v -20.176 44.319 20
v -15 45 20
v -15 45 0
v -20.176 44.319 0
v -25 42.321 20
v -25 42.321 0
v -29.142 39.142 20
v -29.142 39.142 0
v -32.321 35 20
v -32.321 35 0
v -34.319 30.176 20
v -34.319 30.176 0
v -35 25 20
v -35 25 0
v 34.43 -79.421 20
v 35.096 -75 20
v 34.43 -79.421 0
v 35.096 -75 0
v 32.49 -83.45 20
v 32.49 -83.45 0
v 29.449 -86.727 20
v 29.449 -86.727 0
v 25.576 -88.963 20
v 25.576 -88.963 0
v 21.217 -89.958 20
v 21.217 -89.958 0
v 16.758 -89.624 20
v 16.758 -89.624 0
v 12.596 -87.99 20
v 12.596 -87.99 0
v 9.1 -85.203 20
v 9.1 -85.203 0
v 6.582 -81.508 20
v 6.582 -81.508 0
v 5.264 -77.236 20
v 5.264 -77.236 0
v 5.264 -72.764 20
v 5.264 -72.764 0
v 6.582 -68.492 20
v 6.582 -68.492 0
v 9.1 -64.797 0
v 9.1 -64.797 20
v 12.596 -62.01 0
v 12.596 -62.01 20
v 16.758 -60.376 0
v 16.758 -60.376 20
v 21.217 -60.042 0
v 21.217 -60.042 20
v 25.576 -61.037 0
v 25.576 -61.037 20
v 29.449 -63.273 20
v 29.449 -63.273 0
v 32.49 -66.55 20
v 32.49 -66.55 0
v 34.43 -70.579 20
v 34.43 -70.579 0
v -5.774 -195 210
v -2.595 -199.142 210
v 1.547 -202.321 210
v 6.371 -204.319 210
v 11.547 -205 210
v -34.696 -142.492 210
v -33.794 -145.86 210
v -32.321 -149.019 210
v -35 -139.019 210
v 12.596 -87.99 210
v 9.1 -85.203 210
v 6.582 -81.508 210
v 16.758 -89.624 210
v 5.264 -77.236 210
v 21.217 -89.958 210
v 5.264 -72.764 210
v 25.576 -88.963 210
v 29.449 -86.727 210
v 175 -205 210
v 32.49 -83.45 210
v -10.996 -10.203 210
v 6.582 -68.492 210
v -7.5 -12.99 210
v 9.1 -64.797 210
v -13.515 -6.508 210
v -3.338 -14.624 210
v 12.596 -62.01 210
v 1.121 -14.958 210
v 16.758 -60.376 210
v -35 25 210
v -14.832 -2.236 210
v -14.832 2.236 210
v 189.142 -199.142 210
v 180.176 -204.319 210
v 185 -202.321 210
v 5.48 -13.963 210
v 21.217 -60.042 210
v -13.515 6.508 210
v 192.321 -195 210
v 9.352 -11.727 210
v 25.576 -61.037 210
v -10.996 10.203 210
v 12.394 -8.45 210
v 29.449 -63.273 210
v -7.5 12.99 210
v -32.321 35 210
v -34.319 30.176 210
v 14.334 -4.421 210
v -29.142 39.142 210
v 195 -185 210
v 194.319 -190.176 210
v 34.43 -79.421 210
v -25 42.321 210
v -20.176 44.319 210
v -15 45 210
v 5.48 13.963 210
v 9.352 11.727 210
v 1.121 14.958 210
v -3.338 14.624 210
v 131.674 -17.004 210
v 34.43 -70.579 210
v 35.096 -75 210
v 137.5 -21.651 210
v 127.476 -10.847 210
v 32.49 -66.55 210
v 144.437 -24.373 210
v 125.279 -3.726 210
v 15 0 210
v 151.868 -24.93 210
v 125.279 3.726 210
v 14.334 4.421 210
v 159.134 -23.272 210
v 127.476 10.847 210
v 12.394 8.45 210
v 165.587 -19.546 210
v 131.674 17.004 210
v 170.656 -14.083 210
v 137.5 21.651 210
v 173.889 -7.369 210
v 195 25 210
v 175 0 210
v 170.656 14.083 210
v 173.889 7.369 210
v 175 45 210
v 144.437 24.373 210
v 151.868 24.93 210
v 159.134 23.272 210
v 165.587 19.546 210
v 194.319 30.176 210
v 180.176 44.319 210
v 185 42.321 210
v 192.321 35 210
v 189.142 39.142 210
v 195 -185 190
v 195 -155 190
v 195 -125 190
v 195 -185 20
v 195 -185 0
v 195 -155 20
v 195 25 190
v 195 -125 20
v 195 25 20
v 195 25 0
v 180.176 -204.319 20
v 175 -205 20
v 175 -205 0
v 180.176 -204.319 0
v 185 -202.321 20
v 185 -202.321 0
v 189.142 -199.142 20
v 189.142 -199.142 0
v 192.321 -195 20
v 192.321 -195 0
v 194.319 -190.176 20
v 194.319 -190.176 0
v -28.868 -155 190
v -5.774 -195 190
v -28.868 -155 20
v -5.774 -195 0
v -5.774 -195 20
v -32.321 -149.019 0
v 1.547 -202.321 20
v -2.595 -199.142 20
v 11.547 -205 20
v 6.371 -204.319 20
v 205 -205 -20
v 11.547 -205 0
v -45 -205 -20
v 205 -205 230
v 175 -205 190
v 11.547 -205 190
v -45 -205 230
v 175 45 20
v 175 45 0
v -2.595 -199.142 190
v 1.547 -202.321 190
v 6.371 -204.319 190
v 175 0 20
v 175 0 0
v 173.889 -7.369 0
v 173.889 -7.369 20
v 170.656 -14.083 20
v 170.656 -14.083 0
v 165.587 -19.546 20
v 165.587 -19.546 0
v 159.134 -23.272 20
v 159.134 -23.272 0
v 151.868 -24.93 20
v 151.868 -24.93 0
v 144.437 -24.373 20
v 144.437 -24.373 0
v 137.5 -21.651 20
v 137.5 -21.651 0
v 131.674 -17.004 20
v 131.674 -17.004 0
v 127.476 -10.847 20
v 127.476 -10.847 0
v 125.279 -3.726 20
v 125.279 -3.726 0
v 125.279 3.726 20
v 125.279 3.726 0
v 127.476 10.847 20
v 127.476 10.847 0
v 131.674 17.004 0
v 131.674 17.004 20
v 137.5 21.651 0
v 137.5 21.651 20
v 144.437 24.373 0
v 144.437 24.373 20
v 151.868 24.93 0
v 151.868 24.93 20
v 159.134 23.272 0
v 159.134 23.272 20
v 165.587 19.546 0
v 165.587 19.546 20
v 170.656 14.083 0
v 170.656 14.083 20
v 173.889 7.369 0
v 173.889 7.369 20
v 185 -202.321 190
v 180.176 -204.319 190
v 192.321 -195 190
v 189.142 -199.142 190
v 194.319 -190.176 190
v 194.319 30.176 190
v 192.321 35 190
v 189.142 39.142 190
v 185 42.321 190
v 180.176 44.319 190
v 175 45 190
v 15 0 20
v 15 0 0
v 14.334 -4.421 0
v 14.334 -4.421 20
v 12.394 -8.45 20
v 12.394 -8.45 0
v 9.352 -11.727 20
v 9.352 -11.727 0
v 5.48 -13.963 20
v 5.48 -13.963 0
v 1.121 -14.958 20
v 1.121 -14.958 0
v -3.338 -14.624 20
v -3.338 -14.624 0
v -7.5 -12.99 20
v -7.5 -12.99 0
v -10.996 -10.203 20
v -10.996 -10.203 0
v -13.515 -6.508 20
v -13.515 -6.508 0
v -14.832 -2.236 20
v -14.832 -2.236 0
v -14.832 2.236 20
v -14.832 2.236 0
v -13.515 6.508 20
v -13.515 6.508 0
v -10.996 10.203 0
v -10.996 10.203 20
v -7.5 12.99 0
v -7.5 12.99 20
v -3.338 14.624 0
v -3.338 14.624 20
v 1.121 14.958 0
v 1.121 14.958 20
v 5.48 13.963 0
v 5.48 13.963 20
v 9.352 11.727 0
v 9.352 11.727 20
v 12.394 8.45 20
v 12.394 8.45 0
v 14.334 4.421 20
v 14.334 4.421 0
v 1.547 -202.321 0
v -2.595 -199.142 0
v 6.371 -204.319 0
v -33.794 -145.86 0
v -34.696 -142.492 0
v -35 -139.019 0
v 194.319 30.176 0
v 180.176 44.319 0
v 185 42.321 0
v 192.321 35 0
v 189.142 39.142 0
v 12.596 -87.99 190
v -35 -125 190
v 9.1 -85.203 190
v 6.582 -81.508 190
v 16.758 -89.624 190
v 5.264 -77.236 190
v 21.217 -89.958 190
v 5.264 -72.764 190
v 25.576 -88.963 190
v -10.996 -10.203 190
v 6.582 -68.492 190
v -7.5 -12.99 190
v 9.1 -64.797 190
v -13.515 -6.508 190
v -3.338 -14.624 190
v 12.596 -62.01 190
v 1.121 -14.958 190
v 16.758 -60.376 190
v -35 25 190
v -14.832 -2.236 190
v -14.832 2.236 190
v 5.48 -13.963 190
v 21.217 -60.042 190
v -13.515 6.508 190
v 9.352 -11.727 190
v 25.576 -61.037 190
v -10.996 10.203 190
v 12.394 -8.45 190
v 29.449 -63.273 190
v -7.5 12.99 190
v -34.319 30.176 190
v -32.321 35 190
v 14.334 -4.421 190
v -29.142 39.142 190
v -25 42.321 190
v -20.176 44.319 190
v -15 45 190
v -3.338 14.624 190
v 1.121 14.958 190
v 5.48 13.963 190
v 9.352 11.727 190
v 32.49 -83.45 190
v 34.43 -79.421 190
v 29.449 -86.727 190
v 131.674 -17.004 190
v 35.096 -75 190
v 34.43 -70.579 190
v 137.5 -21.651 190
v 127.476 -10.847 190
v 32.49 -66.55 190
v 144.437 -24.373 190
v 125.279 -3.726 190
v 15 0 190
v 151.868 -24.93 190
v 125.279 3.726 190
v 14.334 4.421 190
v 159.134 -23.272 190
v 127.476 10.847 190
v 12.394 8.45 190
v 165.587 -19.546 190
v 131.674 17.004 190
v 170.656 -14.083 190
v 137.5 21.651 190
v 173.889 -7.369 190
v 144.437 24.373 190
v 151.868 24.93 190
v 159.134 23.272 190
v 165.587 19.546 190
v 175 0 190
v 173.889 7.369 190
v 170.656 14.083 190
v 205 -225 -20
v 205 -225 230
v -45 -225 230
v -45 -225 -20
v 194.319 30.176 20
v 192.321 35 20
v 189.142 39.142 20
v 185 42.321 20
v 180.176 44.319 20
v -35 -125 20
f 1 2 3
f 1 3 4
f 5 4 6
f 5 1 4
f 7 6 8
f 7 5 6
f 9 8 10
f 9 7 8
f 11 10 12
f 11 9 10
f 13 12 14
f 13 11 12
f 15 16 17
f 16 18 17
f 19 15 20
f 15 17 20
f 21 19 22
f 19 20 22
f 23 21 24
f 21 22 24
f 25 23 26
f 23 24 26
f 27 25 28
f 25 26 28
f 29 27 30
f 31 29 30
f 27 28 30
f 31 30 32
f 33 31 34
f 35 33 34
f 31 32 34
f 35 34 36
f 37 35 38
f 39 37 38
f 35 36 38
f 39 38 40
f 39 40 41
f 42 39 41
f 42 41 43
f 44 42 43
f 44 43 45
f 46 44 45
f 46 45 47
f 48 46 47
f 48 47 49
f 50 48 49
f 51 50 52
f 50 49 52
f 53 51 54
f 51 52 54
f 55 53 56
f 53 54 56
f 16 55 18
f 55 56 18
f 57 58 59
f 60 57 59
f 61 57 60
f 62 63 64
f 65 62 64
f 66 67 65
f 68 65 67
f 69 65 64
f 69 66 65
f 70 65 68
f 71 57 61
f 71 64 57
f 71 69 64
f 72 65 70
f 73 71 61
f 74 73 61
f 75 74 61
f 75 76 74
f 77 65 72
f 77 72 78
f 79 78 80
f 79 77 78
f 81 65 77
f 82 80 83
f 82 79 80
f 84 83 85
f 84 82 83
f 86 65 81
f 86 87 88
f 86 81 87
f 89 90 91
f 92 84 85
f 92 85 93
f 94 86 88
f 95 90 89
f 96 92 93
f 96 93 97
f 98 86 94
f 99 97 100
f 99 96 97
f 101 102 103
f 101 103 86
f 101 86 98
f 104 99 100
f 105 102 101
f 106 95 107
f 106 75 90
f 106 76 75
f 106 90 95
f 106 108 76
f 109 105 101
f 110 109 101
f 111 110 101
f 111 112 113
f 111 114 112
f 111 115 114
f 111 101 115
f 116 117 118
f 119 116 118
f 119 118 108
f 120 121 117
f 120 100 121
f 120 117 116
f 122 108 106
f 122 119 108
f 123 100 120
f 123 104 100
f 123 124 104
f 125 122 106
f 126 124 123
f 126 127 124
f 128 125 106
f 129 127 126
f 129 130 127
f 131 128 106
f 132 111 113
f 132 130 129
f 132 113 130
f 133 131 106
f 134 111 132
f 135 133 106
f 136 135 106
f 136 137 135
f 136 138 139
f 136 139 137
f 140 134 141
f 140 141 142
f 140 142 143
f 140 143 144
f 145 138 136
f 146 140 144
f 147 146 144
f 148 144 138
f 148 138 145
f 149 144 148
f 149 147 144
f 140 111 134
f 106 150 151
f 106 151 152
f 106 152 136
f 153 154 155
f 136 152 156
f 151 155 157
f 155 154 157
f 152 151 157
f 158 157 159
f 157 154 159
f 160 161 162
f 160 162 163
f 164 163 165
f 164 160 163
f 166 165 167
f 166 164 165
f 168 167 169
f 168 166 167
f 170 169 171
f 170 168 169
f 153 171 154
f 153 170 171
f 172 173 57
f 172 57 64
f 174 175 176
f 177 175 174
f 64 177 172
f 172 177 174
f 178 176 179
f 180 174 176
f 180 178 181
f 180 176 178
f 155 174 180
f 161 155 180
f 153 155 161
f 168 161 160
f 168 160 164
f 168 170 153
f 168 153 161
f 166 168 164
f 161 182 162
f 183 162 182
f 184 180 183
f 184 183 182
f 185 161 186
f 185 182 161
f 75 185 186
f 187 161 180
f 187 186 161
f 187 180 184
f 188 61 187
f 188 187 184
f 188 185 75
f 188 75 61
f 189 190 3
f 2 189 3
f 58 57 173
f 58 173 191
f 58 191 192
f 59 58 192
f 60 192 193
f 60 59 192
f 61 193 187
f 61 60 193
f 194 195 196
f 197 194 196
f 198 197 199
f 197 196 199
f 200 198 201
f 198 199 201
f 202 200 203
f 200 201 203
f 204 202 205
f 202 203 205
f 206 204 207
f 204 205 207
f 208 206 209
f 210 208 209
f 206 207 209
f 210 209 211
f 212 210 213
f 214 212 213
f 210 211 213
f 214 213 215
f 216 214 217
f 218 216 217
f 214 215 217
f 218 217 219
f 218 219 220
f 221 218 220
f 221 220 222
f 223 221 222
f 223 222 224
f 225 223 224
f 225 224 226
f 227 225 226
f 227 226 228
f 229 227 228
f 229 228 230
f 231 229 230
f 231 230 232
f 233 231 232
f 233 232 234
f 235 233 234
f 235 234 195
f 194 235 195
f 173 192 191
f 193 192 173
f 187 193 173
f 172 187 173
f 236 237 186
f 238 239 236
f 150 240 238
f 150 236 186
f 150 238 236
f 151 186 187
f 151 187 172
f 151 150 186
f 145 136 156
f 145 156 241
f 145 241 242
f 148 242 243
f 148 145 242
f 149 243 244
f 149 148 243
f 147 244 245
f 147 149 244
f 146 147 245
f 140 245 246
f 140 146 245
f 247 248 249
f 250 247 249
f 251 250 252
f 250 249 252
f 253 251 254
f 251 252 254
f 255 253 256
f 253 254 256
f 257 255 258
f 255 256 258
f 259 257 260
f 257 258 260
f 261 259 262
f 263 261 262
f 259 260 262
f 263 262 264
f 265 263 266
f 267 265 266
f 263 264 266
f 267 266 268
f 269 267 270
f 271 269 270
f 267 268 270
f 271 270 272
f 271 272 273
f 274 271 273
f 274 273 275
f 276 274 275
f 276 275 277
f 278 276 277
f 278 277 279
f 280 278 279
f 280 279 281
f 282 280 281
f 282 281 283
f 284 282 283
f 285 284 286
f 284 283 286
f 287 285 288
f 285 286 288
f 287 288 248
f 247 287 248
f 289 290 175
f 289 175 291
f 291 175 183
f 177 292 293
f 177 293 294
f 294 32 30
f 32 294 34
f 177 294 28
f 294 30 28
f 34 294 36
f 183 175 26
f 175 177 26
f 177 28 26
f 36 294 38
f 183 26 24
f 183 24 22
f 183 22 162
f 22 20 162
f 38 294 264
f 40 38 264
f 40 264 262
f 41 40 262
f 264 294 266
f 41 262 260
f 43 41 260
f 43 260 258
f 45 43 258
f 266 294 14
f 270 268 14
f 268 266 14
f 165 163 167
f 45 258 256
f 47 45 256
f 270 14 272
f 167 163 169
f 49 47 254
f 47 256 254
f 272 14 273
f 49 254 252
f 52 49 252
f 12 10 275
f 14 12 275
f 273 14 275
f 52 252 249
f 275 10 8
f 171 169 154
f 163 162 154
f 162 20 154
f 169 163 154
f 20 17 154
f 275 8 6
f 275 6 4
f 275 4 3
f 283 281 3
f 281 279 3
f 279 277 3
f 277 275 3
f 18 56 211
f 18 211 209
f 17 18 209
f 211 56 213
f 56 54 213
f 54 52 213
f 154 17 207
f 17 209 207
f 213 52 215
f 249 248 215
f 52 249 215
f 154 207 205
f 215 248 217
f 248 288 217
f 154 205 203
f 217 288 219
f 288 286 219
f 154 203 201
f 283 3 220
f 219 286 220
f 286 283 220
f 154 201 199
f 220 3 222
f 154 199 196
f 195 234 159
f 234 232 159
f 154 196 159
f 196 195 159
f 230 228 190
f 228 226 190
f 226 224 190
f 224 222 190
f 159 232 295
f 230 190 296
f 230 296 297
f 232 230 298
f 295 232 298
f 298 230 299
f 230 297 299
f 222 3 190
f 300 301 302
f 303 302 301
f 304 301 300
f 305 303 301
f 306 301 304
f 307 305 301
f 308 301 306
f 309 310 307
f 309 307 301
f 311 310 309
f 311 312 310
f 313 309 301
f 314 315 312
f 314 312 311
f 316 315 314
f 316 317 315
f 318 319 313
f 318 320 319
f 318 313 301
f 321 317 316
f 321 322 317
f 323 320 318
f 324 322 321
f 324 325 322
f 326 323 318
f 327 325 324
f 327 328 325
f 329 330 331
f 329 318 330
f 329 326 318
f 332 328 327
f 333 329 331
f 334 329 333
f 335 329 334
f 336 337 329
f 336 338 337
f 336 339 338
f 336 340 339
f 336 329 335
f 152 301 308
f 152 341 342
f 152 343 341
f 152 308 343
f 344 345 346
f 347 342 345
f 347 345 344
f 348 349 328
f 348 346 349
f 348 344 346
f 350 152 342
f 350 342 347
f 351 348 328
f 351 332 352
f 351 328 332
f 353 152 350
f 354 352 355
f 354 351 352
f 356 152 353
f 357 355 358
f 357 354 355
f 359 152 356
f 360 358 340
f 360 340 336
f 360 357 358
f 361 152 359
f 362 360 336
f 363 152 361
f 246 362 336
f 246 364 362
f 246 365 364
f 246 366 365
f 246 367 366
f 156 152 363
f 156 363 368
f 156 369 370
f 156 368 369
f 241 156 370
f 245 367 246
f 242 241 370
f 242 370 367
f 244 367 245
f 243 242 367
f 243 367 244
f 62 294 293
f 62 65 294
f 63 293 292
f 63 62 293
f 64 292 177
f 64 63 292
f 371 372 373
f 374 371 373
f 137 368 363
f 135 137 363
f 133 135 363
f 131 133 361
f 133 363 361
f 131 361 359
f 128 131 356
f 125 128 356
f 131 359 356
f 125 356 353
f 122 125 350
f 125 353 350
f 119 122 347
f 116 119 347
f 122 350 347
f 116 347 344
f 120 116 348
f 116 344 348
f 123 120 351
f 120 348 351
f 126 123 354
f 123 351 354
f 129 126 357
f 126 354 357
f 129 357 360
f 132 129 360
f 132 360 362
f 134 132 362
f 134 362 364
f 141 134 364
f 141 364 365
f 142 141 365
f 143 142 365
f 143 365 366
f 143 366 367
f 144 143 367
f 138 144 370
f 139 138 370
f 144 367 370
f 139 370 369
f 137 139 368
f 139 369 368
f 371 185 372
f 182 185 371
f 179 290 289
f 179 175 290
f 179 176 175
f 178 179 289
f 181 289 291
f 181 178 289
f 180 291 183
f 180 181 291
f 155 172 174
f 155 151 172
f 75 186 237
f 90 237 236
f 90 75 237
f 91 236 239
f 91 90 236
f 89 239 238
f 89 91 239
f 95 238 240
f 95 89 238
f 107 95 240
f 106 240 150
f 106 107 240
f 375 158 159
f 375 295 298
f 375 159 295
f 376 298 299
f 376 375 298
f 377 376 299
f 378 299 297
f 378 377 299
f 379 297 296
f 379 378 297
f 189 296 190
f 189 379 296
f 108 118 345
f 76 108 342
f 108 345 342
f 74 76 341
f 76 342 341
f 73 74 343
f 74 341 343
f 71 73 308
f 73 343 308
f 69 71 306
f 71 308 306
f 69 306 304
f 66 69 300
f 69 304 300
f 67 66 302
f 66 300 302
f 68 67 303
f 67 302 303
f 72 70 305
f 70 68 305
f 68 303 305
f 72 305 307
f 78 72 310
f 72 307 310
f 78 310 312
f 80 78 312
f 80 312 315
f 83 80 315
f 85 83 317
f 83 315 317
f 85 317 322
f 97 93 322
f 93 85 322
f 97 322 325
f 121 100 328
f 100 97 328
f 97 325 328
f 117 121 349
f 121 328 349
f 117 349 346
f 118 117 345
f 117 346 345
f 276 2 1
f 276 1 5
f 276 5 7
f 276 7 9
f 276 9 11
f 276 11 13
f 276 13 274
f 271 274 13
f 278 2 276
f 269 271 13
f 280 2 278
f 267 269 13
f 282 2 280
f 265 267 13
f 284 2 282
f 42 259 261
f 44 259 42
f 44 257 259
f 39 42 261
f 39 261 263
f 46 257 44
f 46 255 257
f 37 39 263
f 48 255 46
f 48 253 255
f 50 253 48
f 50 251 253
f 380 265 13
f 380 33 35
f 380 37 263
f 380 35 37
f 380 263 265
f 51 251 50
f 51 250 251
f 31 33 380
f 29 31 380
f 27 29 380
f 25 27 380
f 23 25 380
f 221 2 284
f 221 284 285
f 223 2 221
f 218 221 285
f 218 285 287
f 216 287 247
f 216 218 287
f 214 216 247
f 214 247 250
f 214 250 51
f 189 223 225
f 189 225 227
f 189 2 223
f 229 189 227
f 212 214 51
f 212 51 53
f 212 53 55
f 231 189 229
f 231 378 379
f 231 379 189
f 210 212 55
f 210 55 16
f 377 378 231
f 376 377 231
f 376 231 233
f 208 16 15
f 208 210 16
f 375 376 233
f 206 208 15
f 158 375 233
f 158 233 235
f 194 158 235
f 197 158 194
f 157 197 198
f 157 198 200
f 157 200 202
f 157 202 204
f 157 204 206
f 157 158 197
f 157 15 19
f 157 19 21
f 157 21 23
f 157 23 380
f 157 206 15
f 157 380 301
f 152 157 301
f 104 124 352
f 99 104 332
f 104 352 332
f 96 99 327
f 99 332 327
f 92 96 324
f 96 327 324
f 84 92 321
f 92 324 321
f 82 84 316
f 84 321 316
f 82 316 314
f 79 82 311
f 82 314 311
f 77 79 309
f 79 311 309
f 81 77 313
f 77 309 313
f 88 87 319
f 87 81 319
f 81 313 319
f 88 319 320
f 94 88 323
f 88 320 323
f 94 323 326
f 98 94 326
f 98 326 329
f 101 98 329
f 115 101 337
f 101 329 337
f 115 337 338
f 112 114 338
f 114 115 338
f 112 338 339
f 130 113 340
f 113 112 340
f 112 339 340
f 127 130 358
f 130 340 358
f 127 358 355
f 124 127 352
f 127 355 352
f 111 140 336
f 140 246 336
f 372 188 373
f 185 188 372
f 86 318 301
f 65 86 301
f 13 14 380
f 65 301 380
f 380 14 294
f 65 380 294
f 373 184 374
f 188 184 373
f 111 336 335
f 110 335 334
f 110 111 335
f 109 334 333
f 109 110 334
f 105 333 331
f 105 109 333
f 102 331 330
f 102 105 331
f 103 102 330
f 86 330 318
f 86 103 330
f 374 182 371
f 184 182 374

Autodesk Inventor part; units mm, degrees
ref_plane "YZ Plane" through (0, 0, 0) normal (1, 0, 0) x (0, 1, 0)
ref_plane "XY Plane" through (0, 0, 0) normal (0, 0, 1) x (1, 0, 0)
sketch "Sketch1" plane through (0, 0, 0) normal (0, 0, 1) x (1, 0, 0)
  circle A0 centre (0, 0) radius 15
  circle A1 centre (150, 0) radius 25
  line L0 (-35, 45) -> (-35, -144.3782)
  circle A2 centre (20.0962, -75) radius 15
  line L1 (195, 45) -> (-35, 45)
  line L2 (195, -205) -> (0, -205)
  line L3 (195, -205) -> (195, 45)
  line L4 (0, -205) -> (-35, -144.3782)
  line L5 (0, -205) -> (70, -205) construction
  dimension "d0" = 230
  dimension "d1" = 120
extrude "Extrusion1" add sketch "Sketch1" along normal blind 210
fillet "Fillet1" radius 20 1 edges at (195, 45, 105)
fillet "Fillet2" radius 20 1 edges at (195, -205, 105)
fillet "Fillet3" radius 20 3 edges at (0, -205, 105) (-35, -144.3782, 105) (-35, 45, 105)
sketch "Sketch3" plane through (195, 25, 210) normal (1, 0, 0) x (0, 0, -1)
  line L0 (0, -210) -> (0, 0) projected
  line L1 (0, 20) -> (0, -230)
  line L2 (0, -230) -> (20, -230)
  line L3 (20, -230) -> (20, -180)
  line L4 (20, -180) -> (190, -180)
  line L5 (190, -180) -> (190, -230)
  line L6 (190, -230) -> (210, -230)
  line L7 (210, -230) -> (210, 20)
  line L8 (210, 20) -> (190, 20)
  line L9 (190, 20) -> (190, -150)
  line L10 (190, -150) -> (20, -150)
  line L11 (20, -150) -> (20, 20)
  line L12 (20, 20) -> (0, 20)
  point P0 (210, -25)
  dimension "d17" = 250
  dimension "d18" = 20
  dimension "d19" = 50
  dimension "d20" = 170
  dimension "d21" = 170
extrude "Extrusion3" cut sketch "Sketch3" against normal blind 230 keep common part
ref_plane "Work Plane1" through (175, -205, 10) normal (0, 1, 0) x (-1, 0, 0)
sketch "Sketch4" plane through (175, -205, 10) normal (0, 1, 0) x (-1, 0, 0)
  line L0 (210, -30) -> (220, -30)
  line L1 (220, -30) -> (220, 220)
  line L2 (220, 220) -> (-30, 220)
  line L3 (-30, 220) -> (-30, -30)
  line L4 (-30, -30) -> (210, -30)
  point P0 (175, -10)
  dimension "d25" = 10
  dimension "d26" = 250
  dimension "d27" = 250
  dimension "d28" = 250
extrude "Extrusion4" add sketch "Sketch4" against normal blind 20
properties part number "kepala 1 revisi"
